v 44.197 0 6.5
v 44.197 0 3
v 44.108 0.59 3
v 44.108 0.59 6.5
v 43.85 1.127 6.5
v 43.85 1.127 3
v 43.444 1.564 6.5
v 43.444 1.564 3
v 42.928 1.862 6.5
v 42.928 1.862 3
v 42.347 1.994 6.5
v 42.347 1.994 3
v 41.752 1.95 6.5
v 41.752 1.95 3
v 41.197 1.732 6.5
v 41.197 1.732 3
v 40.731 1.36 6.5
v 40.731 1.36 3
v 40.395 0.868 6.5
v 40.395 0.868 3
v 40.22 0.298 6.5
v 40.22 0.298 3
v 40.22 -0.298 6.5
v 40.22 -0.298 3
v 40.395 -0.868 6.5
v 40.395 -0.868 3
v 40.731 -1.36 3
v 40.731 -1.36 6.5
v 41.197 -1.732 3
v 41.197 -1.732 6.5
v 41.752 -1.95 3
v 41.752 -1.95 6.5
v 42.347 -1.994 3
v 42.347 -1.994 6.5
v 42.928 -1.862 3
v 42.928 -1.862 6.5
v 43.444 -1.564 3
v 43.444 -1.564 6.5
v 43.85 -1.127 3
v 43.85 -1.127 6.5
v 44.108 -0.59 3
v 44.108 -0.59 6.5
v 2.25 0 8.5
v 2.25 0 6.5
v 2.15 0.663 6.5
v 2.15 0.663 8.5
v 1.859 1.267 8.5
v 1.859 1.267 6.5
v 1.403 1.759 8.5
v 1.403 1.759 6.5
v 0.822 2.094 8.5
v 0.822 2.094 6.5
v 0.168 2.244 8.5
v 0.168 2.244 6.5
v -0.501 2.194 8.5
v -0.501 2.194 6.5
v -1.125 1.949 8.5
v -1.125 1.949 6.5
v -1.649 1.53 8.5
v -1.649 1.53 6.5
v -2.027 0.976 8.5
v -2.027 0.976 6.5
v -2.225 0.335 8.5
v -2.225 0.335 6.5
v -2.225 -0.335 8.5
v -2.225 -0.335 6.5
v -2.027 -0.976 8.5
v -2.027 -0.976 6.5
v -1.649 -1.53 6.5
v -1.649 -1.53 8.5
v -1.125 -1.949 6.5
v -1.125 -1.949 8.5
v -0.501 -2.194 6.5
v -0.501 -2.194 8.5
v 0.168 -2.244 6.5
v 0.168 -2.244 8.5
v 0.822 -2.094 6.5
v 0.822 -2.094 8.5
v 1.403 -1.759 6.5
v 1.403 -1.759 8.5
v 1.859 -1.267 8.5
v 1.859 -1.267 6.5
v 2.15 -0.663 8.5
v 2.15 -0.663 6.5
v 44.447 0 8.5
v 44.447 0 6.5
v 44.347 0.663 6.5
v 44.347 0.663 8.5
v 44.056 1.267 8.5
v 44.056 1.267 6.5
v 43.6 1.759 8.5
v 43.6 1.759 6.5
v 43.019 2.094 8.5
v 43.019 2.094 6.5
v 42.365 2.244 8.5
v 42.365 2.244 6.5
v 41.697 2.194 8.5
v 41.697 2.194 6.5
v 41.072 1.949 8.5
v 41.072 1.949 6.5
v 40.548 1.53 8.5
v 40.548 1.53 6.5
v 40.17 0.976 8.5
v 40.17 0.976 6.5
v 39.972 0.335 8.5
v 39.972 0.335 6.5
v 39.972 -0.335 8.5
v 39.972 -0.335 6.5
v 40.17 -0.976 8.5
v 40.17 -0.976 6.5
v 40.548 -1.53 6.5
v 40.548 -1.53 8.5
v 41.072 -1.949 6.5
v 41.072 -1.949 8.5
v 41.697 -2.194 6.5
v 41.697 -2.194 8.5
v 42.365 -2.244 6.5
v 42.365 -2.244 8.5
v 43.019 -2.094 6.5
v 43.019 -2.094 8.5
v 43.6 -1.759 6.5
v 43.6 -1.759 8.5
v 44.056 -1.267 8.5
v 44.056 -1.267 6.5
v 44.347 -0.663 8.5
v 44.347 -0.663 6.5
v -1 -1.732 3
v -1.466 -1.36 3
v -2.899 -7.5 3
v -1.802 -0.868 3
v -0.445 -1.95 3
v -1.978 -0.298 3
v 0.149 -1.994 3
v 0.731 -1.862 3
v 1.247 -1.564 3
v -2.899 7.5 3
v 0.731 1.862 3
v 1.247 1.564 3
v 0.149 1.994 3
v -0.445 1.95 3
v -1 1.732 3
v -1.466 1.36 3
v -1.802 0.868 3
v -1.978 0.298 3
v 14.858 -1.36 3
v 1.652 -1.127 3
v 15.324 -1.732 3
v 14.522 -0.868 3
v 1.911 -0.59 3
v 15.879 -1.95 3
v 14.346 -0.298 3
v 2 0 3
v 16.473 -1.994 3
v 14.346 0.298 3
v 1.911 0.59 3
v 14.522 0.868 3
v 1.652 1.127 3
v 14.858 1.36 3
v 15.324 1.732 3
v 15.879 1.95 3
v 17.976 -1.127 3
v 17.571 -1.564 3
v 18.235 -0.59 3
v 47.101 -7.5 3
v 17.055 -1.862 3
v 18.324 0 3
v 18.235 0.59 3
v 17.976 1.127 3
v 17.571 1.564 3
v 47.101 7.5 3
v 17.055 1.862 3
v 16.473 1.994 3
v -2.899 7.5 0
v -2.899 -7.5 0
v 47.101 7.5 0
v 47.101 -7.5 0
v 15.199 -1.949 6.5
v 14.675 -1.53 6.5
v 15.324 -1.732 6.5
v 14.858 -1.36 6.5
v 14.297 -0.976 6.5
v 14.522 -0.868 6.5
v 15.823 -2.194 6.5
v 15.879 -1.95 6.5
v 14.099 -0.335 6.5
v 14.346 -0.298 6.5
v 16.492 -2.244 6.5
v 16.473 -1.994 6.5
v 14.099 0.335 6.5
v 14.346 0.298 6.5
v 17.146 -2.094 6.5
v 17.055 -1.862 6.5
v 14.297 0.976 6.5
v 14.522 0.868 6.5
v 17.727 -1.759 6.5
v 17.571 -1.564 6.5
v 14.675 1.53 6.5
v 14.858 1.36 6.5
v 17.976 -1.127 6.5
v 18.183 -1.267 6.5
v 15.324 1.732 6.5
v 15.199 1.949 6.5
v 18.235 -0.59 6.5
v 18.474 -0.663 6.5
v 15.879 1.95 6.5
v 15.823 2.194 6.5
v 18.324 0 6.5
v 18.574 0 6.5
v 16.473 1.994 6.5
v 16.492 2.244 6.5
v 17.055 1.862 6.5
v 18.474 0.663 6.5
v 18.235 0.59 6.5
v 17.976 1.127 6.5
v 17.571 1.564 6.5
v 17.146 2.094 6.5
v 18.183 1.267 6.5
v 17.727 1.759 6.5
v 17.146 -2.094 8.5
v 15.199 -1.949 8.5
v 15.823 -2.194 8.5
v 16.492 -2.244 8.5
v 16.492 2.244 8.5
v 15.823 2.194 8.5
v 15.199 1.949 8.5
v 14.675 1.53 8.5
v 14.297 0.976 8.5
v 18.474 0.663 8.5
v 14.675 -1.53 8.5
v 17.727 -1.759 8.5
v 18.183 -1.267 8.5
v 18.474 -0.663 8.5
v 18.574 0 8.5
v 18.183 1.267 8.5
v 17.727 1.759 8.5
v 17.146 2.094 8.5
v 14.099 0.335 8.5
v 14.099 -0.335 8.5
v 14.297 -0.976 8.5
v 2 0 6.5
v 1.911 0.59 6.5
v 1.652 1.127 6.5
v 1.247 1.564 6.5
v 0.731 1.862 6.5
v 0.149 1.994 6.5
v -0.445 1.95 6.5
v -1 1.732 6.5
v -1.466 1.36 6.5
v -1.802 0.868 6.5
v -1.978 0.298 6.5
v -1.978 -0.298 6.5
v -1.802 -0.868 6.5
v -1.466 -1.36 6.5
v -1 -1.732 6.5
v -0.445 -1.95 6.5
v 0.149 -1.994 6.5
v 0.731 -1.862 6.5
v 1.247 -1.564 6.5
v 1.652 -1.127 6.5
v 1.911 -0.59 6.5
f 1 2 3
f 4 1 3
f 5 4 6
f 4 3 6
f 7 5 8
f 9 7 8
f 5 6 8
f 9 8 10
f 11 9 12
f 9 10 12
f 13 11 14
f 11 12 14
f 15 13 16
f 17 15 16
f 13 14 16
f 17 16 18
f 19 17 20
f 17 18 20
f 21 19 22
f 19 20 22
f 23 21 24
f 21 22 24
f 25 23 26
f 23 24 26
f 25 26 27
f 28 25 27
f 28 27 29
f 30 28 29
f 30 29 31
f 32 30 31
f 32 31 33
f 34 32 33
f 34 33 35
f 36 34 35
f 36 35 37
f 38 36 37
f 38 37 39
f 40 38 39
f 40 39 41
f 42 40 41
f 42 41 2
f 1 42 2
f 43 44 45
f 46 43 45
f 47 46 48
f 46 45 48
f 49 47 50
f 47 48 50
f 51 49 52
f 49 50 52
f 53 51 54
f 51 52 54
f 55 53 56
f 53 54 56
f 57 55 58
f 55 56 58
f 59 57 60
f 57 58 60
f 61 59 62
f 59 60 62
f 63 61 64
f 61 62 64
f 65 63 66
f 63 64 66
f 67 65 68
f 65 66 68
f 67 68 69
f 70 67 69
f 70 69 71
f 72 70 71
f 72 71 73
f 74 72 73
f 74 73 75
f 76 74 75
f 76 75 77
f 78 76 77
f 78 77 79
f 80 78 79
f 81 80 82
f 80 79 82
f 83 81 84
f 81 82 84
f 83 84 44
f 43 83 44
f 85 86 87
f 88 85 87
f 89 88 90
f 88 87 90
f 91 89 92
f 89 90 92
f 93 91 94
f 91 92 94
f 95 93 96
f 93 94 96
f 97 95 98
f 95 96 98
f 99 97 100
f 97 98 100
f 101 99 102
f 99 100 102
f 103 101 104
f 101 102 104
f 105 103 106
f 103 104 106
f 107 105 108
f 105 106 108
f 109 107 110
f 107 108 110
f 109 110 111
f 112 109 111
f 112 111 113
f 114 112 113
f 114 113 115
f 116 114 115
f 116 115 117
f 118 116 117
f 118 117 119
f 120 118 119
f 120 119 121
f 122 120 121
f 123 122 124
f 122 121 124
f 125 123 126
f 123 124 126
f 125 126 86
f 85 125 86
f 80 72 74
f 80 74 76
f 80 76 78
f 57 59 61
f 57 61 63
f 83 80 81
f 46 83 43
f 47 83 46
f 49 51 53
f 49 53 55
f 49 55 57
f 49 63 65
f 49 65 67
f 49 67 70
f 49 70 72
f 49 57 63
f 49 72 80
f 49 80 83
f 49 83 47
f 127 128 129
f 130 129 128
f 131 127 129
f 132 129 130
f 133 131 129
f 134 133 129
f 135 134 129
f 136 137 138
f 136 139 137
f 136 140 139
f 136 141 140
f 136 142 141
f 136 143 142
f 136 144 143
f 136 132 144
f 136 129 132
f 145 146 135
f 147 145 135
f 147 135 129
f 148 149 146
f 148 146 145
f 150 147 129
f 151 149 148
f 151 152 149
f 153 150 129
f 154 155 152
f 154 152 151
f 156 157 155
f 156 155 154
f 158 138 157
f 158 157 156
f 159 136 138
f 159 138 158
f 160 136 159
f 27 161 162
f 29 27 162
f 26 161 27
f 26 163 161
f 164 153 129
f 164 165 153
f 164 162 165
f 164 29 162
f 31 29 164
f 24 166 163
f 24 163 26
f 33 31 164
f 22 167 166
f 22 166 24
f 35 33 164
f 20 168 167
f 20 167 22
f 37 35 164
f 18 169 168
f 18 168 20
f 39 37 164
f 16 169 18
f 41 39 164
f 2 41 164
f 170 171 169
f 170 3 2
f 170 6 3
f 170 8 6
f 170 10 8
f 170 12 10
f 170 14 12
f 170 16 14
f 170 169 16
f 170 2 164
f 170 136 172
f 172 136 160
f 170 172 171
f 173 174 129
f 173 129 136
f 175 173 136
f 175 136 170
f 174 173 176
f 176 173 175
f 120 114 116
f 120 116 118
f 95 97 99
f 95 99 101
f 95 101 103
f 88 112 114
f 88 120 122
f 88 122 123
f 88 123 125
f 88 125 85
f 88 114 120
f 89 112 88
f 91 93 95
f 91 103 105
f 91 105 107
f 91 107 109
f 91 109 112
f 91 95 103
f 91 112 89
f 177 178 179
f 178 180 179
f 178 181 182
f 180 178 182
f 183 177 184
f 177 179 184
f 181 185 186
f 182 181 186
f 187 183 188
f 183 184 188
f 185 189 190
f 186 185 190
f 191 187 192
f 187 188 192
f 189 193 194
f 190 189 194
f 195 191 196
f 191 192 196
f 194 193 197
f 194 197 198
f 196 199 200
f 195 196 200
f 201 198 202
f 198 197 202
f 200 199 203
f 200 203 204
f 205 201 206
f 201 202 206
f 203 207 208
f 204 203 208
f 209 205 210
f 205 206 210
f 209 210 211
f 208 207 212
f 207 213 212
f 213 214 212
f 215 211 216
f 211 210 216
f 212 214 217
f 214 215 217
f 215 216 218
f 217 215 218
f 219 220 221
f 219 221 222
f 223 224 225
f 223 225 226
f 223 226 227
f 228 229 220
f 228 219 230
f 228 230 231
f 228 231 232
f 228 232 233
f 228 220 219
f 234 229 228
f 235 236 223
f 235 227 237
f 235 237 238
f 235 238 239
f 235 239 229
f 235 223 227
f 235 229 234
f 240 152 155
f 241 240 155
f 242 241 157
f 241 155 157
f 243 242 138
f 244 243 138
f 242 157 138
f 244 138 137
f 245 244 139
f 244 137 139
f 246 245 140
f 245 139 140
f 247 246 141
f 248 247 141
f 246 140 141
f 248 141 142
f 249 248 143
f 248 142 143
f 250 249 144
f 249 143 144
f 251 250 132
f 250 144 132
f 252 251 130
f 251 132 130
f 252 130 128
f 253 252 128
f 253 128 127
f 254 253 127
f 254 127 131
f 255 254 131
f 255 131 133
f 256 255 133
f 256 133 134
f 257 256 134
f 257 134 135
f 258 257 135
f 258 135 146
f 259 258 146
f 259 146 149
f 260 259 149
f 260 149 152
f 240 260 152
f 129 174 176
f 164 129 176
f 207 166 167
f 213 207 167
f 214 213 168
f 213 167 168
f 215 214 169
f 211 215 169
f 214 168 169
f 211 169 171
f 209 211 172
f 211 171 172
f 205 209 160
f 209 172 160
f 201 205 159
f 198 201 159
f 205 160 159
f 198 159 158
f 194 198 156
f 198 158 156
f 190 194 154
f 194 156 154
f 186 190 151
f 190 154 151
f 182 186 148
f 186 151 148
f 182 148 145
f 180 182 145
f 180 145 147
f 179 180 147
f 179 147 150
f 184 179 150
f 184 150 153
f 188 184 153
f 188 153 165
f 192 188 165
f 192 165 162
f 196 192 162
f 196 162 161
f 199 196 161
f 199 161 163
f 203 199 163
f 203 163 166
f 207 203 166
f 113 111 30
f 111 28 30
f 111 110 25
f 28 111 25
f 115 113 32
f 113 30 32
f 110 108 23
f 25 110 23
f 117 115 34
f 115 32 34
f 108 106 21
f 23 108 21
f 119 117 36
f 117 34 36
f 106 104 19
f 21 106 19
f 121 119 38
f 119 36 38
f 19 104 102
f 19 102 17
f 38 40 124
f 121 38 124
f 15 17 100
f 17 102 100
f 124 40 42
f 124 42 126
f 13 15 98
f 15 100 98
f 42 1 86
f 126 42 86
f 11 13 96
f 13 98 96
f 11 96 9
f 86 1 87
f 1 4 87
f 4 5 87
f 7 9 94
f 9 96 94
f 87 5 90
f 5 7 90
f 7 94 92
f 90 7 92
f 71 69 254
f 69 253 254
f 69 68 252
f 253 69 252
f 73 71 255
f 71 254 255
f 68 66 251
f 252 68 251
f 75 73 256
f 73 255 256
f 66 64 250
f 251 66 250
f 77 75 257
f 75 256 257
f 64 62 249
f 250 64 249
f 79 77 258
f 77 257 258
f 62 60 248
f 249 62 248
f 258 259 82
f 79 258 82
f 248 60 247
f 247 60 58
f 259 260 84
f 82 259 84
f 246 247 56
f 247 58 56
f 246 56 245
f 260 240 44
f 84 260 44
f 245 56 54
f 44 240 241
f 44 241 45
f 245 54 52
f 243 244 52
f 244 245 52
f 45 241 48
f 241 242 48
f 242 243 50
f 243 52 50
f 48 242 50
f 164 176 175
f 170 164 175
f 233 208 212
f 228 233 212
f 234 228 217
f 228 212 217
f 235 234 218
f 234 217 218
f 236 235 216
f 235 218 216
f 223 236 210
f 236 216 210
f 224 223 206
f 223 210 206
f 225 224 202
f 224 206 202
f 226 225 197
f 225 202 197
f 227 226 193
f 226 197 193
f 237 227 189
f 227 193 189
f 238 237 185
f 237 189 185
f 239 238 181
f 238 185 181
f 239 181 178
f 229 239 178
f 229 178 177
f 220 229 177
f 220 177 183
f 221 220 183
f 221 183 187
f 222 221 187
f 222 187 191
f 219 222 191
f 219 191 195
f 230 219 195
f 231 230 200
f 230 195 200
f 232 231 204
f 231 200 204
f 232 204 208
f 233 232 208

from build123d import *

# Parameters (mm, degrees)
F0_W     = 50
F0_H     = 15
F0_R     = 2
F1_DEPTH = 3
F2_DEPTH = 6.5
F3_R     = 2.25
F3_R_2   = 2
F4_DEPTH = 2


with BuildPart() as f1:
    # F0 (on Top) → F1 (new body)
    with BuildSketch(Plane.XY):
        with Locations((22.101158835, 0)):
            Rectangle(F0_W, F0_H)
        Circle(F0_R, mode=Mode.SUBTRACT)
        with Locations((16.3239448783, 0)):
            Circle(F0_R, mode=Mode.SUBTRACT)
        with Locations((42.1971863421, 0)):
            Circle(F0_R, mode=Mode.SUBTRACT)
    extrude(amount=F1_DEPTH)

    # F0 (on Top) → F2 (join)
    with BuildSketch(Plane.XY):
        Circle(F0_R)
        with Locations((16.3239448783, 0)):
            Circle(F0_R)
        with Locations((42.1971863421, 0)):
            Circle(F0_R)
    extrude(amount=F2_DEPTH)

    # F3 (on face) → F4 (join)
    with BuildSketch(Plane.XY.offset(6.5)):
        Circle(F3_R)
        Circle(F3_R_2, mode=Mode.SUBTRACT)
        with Locations((16.3239448783, 0)):
            Circle(F3_R)
        with Locations((16.3239448783, 0)):
            Circle(F3_R_2, mode=Mode.SUBTRACT)
        with Locations((42.1971863421, 0)):
            Circle(F3_R)
        with Locations((42.1971863421, 0)):
            Circle(F3_R_2, mode=Mode.SUBTRACT)
        Circle(F3_R_2)
        with Locations((16.3239448783, 0)):
            Circle(F3_R_2)
        with Locations((42.1971863421, 0)):
            Circle(F3_R_2)
    extrude(amount=F4_DEPTH)


solid = f1.part
